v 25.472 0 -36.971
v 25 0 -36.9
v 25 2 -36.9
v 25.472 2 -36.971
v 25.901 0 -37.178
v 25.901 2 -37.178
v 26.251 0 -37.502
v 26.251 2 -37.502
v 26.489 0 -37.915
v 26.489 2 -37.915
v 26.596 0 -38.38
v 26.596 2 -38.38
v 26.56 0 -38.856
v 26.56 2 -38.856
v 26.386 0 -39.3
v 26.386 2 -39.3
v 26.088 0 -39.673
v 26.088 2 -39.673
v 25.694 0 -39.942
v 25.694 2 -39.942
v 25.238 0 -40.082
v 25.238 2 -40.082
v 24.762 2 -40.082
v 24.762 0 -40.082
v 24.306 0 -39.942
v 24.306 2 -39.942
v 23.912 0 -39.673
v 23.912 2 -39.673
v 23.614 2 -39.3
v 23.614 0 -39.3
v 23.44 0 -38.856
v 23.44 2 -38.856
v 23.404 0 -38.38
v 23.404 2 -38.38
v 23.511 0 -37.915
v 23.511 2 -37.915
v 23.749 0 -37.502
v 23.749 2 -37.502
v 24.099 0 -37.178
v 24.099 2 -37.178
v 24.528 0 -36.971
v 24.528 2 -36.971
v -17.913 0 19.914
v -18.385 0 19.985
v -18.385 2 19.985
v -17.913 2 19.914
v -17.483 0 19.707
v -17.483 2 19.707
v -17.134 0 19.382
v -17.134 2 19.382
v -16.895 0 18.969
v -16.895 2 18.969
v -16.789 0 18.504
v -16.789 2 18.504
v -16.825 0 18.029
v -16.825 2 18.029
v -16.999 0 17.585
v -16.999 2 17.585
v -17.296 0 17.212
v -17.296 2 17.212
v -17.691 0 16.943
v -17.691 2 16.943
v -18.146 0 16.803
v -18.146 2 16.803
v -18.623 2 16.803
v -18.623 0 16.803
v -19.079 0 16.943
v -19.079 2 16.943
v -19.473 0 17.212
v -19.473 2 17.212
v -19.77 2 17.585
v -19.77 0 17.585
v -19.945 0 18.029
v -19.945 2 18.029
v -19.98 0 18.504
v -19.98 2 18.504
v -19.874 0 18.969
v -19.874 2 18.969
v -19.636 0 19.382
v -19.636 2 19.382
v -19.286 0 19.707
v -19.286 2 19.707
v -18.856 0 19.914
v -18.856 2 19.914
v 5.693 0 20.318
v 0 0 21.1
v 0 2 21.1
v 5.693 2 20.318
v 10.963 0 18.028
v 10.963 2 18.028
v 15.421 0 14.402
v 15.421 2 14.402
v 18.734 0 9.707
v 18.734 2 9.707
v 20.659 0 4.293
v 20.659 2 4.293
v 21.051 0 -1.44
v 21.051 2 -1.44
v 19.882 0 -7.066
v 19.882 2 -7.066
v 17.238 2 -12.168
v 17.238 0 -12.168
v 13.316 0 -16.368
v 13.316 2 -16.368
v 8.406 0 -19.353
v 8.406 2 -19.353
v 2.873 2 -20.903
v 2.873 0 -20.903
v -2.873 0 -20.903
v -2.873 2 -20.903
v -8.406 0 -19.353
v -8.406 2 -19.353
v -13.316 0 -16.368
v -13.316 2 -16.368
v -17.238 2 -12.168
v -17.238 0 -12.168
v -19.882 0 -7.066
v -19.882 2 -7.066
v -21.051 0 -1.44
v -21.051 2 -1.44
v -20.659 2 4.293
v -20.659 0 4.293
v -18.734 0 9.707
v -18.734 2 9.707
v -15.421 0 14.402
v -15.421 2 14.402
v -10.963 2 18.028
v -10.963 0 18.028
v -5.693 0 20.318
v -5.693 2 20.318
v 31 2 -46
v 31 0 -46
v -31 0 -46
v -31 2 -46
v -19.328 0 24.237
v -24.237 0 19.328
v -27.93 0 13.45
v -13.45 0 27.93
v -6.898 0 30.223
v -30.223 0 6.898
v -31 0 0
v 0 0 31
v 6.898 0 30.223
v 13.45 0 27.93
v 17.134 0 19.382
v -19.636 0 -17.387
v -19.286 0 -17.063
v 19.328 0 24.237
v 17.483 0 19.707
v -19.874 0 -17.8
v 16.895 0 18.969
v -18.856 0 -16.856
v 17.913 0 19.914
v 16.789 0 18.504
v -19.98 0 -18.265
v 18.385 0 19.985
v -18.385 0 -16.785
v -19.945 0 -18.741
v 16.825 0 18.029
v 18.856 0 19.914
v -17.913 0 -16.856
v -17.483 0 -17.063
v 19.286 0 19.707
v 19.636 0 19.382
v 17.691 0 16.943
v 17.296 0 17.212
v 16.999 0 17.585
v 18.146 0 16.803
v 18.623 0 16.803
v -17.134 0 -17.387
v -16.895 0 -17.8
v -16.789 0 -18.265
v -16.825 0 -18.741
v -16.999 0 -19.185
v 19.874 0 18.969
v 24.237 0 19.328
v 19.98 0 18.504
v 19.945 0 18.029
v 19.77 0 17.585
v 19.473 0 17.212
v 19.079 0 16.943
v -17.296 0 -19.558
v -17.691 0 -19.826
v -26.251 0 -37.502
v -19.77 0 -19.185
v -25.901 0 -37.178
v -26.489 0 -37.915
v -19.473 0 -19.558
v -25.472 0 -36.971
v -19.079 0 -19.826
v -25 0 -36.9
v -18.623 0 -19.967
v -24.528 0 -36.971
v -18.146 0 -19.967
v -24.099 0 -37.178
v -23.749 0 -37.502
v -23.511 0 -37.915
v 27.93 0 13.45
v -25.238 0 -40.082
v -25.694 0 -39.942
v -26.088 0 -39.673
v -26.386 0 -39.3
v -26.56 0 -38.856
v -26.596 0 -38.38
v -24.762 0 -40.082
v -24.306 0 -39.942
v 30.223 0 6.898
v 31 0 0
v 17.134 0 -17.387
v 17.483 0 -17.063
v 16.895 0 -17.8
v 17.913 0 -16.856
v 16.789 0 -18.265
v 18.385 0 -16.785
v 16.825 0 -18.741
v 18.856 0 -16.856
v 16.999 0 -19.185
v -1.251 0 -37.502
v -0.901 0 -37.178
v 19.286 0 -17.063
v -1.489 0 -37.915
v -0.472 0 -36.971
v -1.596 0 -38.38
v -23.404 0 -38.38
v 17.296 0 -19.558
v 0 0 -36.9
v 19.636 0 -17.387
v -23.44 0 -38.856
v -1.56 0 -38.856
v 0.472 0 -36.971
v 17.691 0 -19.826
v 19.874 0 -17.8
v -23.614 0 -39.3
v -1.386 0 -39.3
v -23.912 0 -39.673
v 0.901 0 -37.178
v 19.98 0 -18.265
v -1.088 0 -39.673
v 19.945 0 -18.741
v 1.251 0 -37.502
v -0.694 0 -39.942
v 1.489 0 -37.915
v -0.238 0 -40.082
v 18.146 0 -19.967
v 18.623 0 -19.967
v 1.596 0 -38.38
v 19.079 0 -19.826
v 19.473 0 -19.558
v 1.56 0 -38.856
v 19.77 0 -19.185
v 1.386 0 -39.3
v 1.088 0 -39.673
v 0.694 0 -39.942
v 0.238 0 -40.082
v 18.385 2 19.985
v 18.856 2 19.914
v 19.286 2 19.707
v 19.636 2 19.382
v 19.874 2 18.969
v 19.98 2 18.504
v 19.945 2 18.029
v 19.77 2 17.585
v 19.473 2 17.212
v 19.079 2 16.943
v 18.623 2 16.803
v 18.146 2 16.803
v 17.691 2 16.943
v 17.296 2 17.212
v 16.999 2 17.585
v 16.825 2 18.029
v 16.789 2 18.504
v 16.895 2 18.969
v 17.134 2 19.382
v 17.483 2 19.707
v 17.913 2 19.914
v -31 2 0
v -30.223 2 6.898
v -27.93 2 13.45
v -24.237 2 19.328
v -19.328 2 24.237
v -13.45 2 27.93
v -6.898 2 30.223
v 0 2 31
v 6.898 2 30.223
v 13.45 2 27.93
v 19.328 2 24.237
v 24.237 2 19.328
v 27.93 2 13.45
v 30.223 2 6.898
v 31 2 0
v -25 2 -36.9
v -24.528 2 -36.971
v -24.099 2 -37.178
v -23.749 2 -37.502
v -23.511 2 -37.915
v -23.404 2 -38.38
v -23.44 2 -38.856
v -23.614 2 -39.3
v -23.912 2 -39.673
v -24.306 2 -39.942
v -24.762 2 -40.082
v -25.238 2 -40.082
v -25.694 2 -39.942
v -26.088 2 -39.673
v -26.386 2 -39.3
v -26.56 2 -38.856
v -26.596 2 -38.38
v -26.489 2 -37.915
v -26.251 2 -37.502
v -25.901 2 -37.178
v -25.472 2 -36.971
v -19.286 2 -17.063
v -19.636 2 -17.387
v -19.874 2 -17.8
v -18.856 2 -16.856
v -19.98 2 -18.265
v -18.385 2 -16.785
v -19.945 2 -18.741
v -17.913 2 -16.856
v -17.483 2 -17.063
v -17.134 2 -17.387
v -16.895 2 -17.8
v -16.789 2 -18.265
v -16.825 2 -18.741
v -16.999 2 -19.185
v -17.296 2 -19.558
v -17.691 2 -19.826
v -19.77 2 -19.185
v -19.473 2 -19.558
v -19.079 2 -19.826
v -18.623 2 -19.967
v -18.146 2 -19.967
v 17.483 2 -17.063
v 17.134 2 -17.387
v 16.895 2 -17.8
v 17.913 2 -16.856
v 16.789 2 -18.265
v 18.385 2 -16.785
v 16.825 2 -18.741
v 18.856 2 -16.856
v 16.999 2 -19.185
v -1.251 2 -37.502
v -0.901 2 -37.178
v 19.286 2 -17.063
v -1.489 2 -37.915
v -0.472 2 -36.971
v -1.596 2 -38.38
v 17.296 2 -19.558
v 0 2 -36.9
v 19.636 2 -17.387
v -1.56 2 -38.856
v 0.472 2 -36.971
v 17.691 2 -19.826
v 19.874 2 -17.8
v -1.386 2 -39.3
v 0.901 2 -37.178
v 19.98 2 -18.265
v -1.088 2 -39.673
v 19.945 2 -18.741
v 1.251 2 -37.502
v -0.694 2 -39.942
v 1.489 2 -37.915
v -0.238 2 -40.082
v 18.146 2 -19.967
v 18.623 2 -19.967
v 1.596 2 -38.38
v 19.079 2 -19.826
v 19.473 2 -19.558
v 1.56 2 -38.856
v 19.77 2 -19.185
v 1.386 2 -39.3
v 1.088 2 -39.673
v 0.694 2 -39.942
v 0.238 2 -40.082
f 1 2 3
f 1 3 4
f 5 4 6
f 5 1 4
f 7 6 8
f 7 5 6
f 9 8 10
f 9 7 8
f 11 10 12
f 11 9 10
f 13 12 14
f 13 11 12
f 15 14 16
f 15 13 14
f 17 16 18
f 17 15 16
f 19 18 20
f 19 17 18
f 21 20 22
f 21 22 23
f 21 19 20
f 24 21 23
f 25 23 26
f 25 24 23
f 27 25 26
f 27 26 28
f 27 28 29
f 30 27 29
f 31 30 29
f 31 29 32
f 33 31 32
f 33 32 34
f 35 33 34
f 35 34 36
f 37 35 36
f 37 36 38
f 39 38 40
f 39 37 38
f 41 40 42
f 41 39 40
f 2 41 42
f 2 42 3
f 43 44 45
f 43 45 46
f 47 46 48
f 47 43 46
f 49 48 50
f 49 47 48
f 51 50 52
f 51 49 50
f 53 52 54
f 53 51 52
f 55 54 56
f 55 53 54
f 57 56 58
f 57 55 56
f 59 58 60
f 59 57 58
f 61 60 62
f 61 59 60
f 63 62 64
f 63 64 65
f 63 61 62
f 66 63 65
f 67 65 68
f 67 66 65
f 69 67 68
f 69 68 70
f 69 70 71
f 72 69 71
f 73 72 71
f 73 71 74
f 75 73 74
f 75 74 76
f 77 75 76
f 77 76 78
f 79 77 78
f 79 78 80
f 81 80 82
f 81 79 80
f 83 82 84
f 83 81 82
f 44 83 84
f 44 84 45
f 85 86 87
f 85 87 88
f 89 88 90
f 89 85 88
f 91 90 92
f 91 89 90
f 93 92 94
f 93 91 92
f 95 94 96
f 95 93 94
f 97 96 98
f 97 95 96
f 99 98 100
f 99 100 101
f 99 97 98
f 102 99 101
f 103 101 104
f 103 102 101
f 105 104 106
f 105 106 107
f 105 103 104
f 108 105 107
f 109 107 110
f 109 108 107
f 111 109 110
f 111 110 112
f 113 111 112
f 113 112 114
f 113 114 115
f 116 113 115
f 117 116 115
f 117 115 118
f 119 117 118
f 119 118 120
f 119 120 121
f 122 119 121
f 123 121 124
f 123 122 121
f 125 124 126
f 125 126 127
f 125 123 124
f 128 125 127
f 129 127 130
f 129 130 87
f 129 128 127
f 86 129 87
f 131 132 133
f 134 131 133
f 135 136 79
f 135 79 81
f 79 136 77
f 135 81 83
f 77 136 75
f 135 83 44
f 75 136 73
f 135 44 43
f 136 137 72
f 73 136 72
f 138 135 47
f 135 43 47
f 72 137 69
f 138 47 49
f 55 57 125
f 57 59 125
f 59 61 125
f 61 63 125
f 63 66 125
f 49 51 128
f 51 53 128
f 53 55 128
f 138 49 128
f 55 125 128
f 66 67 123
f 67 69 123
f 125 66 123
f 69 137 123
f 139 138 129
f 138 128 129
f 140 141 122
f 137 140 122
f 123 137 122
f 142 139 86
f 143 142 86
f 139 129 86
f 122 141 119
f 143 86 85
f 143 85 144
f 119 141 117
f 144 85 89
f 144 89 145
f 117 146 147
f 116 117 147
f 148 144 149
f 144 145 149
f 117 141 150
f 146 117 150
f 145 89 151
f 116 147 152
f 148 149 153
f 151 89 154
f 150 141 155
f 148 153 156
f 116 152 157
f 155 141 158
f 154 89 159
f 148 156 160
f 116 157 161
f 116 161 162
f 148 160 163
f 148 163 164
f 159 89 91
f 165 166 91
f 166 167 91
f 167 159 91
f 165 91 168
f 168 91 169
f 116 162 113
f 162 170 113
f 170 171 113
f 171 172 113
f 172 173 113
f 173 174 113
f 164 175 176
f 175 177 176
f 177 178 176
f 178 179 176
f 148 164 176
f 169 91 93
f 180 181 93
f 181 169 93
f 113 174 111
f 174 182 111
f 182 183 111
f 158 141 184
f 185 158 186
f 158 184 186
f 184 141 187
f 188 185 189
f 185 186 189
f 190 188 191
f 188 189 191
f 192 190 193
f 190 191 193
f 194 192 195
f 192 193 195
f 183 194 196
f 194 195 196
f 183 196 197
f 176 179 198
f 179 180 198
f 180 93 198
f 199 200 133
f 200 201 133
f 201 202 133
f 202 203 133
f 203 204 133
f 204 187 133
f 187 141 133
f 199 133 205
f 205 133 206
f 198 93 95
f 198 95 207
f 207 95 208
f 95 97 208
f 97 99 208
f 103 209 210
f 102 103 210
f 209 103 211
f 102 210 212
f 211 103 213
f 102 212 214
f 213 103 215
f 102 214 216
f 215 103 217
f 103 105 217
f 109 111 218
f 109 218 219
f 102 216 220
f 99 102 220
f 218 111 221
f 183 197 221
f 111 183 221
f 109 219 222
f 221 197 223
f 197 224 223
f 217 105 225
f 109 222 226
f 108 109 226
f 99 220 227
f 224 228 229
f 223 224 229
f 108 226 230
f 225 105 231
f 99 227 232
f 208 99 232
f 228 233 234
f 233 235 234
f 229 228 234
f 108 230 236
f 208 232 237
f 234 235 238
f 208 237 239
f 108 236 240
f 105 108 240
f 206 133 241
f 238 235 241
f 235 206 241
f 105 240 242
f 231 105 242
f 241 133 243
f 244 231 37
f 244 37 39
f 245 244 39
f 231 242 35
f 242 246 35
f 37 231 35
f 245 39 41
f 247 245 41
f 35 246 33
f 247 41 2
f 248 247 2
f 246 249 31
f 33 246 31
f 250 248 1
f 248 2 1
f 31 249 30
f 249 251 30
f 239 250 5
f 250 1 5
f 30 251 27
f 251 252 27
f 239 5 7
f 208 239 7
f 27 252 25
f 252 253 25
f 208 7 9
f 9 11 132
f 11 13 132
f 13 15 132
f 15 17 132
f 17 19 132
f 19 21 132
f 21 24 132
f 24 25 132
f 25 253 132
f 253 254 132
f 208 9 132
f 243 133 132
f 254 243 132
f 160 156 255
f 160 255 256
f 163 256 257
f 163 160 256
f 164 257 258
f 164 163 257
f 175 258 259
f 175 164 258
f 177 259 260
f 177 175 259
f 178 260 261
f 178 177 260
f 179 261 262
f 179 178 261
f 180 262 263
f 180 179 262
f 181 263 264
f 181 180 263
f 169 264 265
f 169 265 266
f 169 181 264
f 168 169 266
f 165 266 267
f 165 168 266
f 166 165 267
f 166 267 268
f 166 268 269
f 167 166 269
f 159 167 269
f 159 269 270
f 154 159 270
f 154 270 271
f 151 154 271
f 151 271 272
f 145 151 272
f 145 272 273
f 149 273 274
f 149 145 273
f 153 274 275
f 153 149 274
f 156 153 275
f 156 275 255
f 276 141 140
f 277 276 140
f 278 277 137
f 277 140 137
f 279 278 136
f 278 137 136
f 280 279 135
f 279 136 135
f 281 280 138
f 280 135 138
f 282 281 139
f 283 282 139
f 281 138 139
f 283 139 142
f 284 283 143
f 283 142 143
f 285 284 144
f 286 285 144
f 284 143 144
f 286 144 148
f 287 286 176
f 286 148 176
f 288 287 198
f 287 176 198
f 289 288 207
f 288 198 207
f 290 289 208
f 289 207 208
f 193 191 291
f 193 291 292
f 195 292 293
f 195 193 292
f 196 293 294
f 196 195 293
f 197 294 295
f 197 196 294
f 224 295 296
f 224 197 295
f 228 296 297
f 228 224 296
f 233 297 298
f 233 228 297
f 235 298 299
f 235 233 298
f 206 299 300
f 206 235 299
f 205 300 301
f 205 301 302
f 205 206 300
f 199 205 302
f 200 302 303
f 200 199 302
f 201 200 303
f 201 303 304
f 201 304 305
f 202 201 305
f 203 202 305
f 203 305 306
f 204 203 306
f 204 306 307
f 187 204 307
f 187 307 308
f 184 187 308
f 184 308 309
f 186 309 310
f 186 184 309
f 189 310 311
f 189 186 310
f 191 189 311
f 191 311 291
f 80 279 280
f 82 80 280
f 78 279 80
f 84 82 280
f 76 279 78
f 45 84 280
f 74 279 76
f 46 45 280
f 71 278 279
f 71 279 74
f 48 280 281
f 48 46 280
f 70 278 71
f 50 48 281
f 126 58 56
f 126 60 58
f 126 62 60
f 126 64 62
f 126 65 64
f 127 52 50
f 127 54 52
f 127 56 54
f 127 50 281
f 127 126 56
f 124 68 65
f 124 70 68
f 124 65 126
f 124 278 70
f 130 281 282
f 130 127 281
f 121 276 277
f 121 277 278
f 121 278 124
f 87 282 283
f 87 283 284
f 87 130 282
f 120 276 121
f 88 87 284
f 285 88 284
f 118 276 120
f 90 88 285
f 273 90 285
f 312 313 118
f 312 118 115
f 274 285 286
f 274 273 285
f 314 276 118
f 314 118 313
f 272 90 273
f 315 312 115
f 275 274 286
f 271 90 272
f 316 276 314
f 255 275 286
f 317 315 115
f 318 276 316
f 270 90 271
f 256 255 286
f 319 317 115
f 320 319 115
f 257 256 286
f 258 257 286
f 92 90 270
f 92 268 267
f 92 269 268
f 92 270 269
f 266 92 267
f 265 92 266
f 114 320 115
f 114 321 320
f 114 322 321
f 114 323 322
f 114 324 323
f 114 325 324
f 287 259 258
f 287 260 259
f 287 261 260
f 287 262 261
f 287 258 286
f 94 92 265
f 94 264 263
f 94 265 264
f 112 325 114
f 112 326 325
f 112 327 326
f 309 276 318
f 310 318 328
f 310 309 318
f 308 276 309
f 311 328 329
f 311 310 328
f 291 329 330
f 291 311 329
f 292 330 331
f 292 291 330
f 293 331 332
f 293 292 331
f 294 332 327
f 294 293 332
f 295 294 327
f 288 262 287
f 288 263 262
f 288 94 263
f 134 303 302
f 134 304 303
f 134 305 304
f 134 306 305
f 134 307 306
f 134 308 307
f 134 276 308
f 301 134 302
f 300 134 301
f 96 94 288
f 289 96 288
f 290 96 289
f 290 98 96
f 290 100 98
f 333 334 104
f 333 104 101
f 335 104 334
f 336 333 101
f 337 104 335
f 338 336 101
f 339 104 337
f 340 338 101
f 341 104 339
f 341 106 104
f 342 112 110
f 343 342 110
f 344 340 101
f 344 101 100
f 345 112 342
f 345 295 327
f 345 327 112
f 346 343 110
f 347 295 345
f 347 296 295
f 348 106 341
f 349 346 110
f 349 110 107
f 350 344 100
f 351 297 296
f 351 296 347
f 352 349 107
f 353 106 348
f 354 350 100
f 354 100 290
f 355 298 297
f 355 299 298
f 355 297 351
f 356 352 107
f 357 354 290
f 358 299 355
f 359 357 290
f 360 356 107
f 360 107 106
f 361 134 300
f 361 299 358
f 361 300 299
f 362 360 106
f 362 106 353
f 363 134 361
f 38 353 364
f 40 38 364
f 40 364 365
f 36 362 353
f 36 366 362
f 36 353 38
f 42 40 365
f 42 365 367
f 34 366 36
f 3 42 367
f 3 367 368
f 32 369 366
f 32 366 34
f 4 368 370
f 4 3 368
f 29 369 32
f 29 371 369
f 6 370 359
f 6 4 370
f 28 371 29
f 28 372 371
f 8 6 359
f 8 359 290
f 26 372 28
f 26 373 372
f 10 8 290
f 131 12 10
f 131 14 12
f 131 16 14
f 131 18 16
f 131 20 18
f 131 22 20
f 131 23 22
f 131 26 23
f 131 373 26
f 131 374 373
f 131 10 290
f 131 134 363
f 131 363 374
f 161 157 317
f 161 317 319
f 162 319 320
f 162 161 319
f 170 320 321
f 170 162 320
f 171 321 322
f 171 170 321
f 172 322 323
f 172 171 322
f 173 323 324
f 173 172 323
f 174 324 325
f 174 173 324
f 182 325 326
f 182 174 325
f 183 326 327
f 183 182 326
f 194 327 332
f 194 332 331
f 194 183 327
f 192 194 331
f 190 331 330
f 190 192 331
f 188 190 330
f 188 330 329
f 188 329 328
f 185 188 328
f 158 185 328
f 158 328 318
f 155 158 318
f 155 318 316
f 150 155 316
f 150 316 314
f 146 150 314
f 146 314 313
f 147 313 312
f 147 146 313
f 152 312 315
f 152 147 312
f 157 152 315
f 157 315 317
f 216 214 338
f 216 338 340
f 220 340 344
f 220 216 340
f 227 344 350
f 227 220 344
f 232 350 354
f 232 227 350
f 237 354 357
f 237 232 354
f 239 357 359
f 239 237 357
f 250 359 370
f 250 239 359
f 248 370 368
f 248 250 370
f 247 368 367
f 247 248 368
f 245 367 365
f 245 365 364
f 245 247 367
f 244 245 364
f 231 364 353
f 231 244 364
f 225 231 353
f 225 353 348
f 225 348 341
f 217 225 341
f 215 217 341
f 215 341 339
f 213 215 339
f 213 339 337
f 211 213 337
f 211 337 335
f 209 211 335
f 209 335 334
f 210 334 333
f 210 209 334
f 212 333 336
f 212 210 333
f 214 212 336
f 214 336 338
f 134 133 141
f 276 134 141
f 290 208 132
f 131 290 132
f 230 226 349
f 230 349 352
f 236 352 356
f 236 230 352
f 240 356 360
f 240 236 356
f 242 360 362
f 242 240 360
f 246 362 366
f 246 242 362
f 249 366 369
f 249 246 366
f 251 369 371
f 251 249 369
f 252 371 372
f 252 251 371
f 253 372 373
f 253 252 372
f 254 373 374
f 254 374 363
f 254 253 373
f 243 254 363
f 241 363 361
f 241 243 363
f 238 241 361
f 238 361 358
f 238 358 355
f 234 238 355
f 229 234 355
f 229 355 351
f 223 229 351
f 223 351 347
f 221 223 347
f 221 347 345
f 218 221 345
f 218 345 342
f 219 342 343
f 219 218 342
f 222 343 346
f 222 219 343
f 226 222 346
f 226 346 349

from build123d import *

# Parameters (mm, degrees)
SKETCH_1_R      = 1.6
SKETCH_1_R_2    = 31
SKETCH_1_R_3    = 21.1
EXTRUDE_1_DEPTH = 2


with BuildPart() as part:
    # 草图1 → 凸台-拉伸1 (new body)
    # profile 1 of 2: a face of its own
    with BuildSketch(Plane(origin=(0, 0, 0), x_dir=(1, 0, 0), z_dir=(0, 1, 0))):
        with BuildLine():
            Line((-31, 31), (-31, 0))
            ThreePointArc((-31, 0), (0, 31), (31, 0))
            Line((31, 0), (31, 31))
            Line((31, 31), (31, 46))
            Line((31, 46), (-31, 46))
            Line((-31, 46), (-31, 31))
        make_face()
        with Locations(Location((-25, 38.5, 0), (0, 0, 270))):
            Circle(SKETCH_1_R, mode=Mode.SUBTRACT)
        with Locations(Location((0, 38.5, 0), (0, 0, 270))):
            Circle(SKETCH_1_R, mode=Mode.SUBTRACT)
        with Locations(Location((25, 38.5, 0), (0, 0, 270))):
            Circle(SKETCH_1_R, mode=Mode.SUBTRACT)
    # profile 2 of 2: a face of its own
    with BuildSketch(Plane(origin=(0, 0, 0), x_dir=(1, 0, 0), z_dir=(0, 1, 0))):
        Circle(SKETCH_1_R_2)
        with Locations(Location((-18.384776311, 18.384776311, 0), (0, 0, 270))):
            Circle(SKETCH_1_R, mode=Mode.SUBTRACT)
        with Locations(Location((-18.384776311, -18.384776311, 0), (0, 0, 270))):
            Circle(SKETCH_1_R, mode=Mode.SUBTRACT)
        with Locations(Location((18.384776311, -18.384776311, 0), (0, 0, 270))):
            Circle(SKETCH_1_R, mode=Mode.SUBTRACT)
        with Locations(Location((18.384776311, 18.384776311, 0), (0, 0, 270))):
            Circle(SKETCH_1_R, mode=Mode.SUBTRACT)
        with Locations(Location((0, 0, 0), (0, 0, 270))):
            Circle(SKETCH_1_R_3, mode=Mode.SUBTRACT)
    extrude(amount=EXTRUDE_1_DEPTH)


solid = part.part
